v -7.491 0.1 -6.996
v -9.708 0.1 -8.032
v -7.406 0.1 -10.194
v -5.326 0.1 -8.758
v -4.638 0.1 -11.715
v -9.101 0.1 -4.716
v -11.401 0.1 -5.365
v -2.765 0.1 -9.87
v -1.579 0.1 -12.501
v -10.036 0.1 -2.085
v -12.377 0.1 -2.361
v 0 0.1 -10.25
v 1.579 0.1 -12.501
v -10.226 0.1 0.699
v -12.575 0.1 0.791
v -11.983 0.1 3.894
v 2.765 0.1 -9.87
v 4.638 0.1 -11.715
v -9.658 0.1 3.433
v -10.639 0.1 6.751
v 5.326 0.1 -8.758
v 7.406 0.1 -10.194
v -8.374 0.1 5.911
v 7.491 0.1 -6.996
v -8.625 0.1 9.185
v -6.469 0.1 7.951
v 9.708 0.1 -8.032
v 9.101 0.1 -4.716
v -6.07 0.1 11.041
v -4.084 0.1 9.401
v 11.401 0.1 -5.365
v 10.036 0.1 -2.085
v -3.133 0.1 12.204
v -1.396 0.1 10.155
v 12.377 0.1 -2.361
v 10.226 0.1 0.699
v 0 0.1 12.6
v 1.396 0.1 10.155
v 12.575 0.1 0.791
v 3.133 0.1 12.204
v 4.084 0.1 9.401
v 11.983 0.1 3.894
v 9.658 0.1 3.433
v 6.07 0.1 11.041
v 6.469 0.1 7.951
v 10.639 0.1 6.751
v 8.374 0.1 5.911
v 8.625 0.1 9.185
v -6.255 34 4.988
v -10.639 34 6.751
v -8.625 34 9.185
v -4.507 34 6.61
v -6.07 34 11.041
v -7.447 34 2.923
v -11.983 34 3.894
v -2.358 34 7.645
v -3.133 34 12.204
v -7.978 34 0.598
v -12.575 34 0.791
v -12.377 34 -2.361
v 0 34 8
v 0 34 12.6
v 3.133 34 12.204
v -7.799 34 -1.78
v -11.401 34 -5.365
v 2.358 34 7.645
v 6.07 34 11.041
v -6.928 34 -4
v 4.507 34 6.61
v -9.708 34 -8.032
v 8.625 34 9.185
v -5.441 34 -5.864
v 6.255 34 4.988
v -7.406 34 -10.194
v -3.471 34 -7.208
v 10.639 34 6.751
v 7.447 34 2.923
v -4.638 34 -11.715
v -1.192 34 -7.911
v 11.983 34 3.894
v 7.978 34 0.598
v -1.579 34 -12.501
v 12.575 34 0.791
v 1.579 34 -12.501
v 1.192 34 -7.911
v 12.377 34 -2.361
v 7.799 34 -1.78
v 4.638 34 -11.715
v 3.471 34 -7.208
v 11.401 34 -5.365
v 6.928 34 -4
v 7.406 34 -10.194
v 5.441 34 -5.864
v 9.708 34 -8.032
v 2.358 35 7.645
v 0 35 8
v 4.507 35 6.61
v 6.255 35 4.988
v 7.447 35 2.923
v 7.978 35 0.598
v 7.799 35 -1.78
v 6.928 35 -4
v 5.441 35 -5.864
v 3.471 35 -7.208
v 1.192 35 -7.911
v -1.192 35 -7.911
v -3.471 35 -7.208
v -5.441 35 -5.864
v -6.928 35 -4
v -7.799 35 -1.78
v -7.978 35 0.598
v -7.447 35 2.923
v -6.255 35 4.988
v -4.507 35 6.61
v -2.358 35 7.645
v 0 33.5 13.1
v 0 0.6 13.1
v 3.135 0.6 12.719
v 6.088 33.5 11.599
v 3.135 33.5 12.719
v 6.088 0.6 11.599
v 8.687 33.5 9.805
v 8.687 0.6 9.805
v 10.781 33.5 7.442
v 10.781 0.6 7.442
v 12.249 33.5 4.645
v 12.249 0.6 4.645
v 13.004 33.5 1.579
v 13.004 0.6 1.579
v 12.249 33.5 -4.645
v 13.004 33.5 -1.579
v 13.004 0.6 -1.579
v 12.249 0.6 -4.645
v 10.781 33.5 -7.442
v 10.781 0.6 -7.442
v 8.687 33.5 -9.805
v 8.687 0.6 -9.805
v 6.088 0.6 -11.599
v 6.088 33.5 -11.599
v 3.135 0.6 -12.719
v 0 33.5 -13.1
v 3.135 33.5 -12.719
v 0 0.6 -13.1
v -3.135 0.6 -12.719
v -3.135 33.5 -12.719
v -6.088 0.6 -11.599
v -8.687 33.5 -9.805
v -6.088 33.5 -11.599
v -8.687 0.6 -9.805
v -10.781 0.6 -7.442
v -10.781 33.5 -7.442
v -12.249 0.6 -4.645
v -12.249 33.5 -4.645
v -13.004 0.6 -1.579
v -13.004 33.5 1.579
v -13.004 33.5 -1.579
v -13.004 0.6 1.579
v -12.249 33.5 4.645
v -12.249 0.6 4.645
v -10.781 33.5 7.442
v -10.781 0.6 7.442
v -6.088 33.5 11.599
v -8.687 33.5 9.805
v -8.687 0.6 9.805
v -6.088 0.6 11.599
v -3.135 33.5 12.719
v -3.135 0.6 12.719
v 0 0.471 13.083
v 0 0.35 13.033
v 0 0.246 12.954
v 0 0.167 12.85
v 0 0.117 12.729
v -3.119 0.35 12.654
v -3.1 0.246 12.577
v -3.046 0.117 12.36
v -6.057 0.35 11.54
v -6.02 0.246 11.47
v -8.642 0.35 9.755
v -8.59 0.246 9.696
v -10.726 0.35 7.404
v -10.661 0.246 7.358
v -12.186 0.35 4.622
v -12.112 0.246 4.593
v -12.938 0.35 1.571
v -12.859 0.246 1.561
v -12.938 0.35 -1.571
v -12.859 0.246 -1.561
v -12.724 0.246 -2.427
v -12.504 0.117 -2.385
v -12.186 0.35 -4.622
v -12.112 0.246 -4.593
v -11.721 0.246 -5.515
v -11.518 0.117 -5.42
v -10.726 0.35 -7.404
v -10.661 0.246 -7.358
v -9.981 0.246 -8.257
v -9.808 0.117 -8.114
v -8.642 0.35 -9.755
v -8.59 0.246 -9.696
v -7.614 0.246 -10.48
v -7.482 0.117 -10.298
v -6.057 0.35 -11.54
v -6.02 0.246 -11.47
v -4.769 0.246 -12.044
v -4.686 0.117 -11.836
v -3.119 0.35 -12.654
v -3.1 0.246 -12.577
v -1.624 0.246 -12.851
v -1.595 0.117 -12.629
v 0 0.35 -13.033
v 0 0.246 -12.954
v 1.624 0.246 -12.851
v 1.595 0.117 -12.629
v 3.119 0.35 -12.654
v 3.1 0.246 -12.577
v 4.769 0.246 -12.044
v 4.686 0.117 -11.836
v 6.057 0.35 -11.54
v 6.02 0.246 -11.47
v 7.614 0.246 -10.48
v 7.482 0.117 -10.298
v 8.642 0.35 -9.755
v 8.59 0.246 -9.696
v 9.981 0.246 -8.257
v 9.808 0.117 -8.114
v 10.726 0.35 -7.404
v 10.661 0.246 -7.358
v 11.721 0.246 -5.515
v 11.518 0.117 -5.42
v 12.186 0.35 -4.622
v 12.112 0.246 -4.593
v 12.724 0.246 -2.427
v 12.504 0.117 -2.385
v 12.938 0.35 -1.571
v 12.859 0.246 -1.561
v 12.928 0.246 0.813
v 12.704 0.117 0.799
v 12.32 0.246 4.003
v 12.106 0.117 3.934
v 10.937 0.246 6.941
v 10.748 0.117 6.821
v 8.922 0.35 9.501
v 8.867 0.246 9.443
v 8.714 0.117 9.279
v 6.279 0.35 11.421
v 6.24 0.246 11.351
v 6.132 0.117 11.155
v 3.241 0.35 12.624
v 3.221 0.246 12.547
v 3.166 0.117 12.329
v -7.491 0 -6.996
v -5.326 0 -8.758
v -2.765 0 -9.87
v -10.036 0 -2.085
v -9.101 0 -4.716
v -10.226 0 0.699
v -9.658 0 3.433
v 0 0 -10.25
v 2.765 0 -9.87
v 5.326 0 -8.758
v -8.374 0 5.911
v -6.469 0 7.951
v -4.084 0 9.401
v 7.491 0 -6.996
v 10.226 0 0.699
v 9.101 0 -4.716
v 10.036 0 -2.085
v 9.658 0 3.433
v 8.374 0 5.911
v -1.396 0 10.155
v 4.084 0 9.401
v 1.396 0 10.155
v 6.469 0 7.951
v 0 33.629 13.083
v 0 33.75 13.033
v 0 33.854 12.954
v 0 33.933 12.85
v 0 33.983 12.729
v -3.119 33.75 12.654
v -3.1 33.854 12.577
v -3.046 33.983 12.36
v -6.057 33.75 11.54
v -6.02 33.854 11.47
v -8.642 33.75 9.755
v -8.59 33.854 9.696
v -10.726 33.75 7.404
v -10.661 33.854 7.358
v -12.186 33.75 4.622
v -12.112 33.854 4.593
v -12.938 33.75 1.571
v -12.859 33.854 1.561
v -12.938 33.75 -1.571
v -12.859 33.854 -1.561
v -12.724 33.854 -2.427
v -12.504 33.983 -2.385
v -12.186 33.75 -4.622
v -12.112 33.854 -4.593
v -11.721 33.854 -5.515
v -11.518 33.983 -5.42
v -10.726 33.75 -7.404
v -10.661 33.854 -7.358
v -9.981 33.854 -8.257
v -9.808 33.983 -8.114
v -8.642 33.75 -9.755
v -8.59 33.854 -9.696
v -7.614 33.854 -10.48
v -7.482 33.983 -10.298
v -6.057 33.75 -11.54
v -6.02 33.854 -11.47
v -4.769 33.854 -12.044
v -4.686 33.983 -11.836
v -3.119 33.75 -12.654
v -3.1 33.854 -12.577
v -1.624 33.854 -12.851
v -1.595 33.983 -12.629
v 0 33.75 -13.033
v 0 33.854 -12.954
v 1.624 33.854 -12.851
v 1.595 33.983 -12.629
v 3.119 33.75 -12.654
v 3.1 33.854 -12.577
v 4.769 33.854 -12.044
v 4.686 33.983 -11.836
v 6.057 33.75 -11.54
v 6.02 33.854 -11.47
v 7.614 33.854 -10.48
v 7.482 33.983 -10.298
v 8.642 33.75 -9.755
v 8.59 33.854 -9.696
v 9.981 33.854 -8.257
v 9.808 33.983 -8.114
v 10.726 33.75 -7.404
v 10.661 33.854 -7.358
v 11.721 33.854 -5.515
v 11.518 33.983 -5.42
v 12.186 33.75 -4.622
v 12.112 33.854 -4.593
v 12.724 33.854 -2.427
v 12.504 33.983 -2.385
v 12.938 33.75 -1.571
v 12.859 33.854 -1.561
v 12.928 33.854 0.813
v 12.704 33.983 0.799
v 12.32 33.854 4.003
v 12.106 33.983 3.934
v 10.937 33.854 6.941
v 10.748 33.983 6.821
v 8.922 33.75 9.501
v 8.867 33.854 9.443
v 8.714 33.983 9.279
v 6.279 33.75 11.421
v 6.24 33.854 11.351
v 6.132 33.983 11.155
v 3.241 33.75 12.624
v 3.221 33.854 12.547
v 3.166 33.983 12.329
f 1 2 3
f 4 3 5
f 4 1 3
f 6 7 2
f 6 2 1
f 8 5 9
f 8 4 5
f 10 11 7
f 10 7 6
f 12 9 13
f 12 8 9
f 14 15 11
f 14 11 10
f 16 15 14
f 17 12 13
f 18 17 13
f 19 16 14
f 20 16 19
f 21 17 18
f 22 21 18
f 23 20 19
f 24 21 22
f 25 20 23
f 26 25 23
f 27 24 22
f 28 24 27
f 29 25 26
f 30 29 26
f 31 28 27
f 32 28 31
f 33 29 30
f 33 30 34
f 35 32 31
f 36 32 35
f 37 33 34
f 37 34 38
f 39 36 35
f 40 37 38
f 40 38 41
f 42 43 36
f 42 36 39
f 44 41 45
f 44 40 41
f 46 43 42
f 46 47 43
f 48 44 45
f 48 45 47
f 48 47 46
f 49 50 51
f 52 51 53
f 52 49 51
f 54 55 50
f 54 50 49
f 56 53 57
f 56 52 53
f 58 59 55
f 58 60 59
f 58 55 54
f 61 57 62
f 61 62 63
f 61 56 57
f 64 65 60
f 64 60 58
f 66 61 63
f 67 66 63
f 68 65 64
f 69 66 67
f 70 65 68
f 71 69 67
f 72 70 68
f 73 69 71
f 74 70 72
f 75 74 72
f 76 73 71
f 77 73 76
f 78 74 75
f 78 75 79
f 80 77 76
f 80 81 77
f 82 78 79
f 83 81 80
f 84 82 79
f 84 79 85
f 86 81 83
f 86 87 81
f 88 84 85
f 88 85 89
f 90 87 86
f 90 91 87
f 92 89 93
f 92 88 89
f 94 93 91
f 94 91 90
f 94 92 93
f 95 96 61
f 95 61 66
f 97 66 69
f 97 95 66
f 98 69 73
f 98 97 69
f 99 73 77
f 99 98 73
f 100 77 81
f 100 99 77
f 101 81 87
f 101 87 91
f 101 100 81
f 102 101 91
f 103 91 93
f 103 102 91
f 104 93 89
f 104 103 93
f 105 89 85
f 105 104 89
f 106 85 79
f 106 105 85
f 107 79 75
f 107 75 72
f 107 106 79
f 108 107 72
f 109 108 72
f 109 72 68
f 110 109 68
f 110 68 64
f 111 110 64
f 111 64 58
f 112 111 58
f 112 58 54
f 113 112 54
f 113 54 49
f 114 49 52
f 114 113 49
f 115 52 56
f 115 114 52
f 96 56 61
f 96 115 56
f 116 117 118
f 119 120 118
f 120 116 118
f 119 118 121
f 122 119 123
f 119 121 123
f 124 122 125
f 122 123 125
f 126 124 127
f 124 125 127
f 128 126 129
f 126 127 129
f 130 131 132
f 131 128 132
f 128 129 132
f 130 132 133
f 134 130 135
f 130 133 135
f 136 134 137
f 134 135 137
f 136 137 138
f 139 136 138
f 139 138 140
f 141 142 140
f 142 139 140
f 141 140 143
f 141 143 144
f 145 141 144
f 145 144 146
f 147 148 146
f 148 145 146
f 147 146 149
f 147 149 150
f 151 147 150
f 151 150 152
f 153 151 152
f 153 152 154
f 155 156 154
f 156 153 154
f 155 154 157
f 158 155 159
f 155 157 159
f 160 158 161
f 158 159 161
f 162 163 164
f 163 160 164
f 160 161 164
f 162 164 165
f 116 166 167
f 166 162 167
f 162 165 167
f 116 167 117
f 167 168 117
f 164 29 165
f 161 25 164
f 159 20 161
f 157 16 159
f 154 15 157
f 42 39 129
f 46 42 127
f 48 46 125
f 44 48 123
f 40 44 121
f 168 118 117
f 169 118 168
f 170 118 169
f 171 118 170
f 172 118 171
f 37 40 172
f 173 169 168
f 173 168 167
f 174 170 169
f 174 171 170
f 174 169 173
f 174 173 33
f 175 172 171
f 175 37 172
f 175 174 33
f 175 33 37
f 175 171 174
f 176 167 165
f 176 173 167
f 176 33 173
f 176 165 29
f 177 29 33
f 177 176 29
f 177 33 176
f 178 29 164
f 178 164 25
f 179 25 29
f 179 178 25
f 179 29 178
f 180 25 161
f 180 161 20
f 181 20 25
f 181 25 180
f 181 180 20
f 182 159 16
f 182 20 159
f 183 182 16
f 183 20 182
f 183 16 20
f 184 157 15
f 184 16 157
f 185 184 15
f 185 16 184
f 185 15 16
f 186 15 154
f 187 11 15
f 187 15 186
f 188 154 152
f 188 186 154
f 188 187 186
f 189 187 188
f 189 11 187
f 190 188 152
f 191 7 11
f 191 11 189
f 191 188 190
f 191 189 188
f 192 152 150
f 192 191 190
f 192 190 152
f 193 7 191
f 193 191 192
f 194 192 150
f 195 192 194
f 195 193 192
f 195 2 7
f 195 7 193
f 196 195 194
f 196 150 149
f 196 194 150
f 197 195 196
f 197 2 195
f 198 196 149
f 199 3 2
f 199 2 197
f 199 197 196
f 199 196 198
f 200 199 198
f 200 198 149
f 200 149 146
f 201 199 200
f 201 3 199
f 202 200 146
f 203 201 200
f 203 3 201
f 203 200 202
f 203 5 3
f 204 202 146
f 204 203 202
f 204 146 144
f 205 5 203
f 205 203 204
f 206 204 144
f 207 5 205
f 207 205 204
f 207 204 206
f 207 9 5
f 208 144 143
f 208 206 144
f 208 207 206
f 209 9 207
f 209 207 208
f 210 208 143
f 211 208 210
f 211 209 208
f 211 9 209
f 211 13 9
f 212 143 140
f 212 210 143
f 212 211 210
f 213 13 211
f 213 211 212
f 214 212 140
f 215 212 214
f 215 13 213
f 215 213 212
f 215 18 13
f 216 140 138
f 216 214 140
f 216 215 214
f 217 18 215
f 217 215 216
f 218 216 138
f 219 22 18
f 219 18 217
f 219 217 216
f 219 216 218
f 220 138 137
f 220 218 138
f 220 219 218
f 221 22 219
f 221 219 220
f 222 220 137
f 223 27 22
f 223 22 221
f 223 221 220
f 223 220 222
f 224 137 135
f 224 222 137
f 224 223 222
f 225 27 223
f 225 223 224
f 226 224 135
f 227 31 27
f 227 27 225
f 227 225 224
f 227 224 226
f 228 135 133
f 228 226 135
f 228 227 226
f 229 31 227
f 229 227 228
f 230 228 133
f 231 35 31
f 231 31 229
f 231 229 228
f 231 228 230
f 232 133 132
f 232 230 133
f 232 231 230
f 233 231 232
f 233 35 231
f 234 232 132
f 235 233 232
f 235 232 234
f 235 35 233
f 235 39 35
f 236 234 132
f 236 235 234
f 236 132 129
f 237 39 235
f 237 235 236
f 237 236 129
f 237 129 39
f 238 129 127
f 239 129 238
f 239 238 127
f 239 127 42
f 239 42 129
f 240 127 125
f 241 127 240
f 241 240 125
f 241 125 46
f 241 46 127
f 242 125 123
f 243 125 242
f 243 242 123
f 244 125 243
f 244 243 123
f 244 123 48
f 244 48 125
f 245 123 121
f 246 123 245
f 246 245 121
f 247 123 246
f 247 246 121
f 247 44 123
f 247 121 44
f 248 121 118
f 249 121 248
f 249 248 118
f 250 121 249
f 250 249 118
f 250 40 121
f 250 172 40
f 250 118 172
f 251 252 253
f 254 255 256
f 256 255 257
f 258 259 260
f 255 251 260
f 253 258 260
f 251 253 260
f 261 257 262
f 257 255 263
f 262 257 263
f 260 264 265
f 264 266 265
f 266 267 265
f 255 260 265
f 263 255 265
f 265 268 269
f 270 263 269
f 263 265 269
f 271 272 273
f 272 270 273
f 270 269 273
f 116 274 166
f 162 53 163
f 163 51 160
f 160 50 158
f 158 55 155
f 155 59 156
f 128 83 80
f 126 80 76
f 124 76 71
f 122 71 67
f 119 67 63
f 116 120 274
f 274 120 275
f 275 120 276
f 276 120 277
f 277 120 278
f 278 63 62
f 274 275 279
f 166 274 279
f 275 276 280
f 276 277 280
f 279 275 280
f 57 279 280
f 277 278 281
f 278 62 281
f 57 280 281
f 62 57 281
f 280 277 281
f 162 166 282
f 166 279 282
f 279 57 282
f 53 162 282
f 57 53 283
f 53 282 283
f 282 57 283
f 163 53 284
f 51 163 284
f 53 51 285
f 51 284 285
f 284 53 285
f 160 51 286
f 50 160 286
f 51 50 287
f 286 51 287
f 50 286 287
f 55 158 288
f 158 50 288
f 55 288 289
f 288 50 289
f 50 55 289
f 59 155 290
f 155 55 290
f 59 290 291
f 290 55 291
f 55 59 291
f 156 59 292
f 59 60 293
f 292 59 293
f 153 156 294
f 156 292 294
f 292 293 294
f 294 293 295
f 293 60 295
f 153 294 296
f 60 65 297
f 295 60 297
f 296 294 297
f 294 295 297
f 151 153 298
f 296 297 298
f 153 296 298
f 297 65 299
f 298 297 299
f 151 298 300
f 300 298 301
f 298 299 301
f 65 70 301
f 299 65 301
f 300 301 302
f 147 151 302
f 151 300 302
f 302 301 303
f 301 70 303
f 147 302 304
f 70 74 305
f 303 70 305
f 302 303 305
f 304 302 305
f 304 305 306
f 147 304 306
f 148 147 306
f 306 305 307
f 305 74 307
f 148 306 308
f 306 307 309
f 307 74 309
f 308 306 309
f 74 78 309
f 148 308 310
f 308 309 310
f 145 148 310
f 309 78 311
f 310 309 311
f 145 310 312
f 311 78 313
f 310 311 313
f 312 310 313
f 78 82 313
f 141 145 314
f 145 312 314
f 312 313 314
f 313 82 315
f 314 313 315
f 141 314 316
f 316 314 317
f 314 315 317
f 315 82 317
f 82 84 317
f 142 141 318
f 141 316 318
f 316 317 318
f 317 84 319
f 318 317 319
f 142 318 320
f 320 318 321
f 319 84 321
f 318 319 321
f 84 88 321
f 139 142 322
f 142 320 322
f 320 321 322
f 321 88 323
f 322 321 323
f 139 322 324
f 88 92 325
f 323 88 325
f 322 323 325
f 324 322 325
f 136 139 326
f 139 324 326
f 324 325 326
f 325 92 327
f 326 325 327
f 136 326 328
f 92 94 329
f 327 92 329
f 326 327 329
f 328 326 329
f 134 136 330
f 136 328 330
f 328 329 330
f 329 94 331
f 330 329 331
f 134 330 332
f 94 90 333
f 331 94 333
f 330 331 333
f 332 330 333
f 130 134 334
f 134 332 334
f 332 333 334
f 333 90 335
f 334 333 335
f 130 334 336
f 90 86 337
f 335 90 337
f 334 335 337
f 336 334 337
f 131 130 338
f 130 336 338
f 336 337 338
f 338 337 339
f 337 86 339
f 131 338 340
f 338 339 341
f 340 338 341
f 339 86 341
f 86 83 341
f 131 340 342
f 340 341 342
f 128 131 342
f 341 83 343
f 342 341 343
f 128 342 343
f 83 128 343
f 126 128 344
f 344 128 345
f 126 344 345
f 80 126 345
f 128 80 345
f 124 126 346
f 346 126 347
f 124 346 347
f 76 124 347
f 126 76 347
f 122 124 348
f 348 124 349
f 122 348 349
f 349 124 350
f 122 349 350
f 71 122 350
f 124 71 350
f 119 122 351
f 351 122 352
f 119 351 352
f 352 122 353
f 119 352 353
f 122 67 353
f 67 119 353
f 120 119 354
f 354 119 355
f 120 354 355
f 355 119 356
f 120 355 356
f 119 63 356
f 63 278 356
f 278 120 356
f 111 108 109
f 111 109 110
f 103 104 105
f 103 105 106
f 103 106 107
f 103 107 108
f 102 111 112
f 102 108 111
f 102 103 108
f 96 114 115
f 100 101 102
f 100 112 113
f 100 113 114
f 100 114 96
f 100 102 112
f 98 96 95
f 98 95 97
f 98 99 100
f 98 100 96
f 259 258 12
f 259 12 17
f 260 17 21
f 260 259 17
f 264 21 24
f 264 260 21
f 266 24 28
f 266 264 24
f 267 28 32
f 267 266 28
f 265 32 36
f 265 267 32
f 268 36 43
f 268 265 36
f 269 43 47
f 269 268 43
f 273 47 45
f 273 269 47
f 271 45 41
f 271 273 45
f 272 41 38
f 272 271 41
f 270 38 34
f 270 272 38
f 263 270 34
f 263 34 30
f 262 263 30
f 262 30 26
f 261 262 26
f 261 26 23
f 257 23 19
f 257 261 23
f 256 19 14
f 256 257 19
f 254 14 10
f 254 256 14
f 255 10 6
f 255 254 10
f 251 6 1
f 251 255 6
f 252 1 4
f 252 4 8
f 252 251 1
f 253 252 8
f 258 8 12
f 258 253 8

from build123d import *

# Parameters (mm, degrees)
SKETCH_1_R          = 13.1
EXTRUDE_1_DEPTH     = 35
SKETCH_2_R          = 19.270653491
SKETCH_2_R_2        = 8
CUT_EXTRUDE_1_DEPTH = 1
SKETCH_3_R          = 17.55104744
SKETCH_3_R_2        = 10.25
CUT_EXTRUDE_2_DEPTH = 0.1
FILLET_1_R          = 0.5


with BuildPart() as part:
    # Эскиз1 → Бобышка-Вытянуть1 (new body)
    with BuildSketch(Plane(origin=(0, 0, 0), x_dir=(1, 0, 0), z_dir=(0, 1, 0))):
        with Locations(Location((0, 0, 0), (0, 0, 270))):
            Circle(SKETCH_1_R)
    extrude(amount=EXTRUDE_1_DEPTH)

    # Эскиз2 → Вырез-Вытянуть1 (cut)
    with BuildSketch(Plane(origin=(0, 35, 0), x_dir=(1, 0, 0), z_dir=(0, 1, 0))):
        Circle(SKETCH_2_R)
        with Locations(Location((0, 0, 0), (0, 0, 270))):
            Circle(SKETCH_2_R_2, mode=Mode.SUBTRACT)
    extrude(amount=-CUT_EXTRUDE_1_DEPTH, mode=Mode.SUBTRACT)

    # Эскиз3 → Вырез-Вытянуть2 (cut)
    with BuildSketch(Plane.XZ):
        Circle(SKETCH_3_R)
        with Locations(Location((0, 0, 0), (0, 0, 270))):
            Circle(SKETCH_3_R_2, mode=Mode.SUBTRACT)
    extrude(amount=-CUT_EXTRUDE_2_DEPTH, mode=Mode.SUBTRACT)

    # Скругление1
    fillet_1_edges = [part.edges().sort_by_distance(p)[0] for p in [
        (0, 0.1, -13.1),
        (0, 34, -13.1),
    ]]
    fillet(fillet_1_edges, radius=FILLET_1_R)


solid = part.part
